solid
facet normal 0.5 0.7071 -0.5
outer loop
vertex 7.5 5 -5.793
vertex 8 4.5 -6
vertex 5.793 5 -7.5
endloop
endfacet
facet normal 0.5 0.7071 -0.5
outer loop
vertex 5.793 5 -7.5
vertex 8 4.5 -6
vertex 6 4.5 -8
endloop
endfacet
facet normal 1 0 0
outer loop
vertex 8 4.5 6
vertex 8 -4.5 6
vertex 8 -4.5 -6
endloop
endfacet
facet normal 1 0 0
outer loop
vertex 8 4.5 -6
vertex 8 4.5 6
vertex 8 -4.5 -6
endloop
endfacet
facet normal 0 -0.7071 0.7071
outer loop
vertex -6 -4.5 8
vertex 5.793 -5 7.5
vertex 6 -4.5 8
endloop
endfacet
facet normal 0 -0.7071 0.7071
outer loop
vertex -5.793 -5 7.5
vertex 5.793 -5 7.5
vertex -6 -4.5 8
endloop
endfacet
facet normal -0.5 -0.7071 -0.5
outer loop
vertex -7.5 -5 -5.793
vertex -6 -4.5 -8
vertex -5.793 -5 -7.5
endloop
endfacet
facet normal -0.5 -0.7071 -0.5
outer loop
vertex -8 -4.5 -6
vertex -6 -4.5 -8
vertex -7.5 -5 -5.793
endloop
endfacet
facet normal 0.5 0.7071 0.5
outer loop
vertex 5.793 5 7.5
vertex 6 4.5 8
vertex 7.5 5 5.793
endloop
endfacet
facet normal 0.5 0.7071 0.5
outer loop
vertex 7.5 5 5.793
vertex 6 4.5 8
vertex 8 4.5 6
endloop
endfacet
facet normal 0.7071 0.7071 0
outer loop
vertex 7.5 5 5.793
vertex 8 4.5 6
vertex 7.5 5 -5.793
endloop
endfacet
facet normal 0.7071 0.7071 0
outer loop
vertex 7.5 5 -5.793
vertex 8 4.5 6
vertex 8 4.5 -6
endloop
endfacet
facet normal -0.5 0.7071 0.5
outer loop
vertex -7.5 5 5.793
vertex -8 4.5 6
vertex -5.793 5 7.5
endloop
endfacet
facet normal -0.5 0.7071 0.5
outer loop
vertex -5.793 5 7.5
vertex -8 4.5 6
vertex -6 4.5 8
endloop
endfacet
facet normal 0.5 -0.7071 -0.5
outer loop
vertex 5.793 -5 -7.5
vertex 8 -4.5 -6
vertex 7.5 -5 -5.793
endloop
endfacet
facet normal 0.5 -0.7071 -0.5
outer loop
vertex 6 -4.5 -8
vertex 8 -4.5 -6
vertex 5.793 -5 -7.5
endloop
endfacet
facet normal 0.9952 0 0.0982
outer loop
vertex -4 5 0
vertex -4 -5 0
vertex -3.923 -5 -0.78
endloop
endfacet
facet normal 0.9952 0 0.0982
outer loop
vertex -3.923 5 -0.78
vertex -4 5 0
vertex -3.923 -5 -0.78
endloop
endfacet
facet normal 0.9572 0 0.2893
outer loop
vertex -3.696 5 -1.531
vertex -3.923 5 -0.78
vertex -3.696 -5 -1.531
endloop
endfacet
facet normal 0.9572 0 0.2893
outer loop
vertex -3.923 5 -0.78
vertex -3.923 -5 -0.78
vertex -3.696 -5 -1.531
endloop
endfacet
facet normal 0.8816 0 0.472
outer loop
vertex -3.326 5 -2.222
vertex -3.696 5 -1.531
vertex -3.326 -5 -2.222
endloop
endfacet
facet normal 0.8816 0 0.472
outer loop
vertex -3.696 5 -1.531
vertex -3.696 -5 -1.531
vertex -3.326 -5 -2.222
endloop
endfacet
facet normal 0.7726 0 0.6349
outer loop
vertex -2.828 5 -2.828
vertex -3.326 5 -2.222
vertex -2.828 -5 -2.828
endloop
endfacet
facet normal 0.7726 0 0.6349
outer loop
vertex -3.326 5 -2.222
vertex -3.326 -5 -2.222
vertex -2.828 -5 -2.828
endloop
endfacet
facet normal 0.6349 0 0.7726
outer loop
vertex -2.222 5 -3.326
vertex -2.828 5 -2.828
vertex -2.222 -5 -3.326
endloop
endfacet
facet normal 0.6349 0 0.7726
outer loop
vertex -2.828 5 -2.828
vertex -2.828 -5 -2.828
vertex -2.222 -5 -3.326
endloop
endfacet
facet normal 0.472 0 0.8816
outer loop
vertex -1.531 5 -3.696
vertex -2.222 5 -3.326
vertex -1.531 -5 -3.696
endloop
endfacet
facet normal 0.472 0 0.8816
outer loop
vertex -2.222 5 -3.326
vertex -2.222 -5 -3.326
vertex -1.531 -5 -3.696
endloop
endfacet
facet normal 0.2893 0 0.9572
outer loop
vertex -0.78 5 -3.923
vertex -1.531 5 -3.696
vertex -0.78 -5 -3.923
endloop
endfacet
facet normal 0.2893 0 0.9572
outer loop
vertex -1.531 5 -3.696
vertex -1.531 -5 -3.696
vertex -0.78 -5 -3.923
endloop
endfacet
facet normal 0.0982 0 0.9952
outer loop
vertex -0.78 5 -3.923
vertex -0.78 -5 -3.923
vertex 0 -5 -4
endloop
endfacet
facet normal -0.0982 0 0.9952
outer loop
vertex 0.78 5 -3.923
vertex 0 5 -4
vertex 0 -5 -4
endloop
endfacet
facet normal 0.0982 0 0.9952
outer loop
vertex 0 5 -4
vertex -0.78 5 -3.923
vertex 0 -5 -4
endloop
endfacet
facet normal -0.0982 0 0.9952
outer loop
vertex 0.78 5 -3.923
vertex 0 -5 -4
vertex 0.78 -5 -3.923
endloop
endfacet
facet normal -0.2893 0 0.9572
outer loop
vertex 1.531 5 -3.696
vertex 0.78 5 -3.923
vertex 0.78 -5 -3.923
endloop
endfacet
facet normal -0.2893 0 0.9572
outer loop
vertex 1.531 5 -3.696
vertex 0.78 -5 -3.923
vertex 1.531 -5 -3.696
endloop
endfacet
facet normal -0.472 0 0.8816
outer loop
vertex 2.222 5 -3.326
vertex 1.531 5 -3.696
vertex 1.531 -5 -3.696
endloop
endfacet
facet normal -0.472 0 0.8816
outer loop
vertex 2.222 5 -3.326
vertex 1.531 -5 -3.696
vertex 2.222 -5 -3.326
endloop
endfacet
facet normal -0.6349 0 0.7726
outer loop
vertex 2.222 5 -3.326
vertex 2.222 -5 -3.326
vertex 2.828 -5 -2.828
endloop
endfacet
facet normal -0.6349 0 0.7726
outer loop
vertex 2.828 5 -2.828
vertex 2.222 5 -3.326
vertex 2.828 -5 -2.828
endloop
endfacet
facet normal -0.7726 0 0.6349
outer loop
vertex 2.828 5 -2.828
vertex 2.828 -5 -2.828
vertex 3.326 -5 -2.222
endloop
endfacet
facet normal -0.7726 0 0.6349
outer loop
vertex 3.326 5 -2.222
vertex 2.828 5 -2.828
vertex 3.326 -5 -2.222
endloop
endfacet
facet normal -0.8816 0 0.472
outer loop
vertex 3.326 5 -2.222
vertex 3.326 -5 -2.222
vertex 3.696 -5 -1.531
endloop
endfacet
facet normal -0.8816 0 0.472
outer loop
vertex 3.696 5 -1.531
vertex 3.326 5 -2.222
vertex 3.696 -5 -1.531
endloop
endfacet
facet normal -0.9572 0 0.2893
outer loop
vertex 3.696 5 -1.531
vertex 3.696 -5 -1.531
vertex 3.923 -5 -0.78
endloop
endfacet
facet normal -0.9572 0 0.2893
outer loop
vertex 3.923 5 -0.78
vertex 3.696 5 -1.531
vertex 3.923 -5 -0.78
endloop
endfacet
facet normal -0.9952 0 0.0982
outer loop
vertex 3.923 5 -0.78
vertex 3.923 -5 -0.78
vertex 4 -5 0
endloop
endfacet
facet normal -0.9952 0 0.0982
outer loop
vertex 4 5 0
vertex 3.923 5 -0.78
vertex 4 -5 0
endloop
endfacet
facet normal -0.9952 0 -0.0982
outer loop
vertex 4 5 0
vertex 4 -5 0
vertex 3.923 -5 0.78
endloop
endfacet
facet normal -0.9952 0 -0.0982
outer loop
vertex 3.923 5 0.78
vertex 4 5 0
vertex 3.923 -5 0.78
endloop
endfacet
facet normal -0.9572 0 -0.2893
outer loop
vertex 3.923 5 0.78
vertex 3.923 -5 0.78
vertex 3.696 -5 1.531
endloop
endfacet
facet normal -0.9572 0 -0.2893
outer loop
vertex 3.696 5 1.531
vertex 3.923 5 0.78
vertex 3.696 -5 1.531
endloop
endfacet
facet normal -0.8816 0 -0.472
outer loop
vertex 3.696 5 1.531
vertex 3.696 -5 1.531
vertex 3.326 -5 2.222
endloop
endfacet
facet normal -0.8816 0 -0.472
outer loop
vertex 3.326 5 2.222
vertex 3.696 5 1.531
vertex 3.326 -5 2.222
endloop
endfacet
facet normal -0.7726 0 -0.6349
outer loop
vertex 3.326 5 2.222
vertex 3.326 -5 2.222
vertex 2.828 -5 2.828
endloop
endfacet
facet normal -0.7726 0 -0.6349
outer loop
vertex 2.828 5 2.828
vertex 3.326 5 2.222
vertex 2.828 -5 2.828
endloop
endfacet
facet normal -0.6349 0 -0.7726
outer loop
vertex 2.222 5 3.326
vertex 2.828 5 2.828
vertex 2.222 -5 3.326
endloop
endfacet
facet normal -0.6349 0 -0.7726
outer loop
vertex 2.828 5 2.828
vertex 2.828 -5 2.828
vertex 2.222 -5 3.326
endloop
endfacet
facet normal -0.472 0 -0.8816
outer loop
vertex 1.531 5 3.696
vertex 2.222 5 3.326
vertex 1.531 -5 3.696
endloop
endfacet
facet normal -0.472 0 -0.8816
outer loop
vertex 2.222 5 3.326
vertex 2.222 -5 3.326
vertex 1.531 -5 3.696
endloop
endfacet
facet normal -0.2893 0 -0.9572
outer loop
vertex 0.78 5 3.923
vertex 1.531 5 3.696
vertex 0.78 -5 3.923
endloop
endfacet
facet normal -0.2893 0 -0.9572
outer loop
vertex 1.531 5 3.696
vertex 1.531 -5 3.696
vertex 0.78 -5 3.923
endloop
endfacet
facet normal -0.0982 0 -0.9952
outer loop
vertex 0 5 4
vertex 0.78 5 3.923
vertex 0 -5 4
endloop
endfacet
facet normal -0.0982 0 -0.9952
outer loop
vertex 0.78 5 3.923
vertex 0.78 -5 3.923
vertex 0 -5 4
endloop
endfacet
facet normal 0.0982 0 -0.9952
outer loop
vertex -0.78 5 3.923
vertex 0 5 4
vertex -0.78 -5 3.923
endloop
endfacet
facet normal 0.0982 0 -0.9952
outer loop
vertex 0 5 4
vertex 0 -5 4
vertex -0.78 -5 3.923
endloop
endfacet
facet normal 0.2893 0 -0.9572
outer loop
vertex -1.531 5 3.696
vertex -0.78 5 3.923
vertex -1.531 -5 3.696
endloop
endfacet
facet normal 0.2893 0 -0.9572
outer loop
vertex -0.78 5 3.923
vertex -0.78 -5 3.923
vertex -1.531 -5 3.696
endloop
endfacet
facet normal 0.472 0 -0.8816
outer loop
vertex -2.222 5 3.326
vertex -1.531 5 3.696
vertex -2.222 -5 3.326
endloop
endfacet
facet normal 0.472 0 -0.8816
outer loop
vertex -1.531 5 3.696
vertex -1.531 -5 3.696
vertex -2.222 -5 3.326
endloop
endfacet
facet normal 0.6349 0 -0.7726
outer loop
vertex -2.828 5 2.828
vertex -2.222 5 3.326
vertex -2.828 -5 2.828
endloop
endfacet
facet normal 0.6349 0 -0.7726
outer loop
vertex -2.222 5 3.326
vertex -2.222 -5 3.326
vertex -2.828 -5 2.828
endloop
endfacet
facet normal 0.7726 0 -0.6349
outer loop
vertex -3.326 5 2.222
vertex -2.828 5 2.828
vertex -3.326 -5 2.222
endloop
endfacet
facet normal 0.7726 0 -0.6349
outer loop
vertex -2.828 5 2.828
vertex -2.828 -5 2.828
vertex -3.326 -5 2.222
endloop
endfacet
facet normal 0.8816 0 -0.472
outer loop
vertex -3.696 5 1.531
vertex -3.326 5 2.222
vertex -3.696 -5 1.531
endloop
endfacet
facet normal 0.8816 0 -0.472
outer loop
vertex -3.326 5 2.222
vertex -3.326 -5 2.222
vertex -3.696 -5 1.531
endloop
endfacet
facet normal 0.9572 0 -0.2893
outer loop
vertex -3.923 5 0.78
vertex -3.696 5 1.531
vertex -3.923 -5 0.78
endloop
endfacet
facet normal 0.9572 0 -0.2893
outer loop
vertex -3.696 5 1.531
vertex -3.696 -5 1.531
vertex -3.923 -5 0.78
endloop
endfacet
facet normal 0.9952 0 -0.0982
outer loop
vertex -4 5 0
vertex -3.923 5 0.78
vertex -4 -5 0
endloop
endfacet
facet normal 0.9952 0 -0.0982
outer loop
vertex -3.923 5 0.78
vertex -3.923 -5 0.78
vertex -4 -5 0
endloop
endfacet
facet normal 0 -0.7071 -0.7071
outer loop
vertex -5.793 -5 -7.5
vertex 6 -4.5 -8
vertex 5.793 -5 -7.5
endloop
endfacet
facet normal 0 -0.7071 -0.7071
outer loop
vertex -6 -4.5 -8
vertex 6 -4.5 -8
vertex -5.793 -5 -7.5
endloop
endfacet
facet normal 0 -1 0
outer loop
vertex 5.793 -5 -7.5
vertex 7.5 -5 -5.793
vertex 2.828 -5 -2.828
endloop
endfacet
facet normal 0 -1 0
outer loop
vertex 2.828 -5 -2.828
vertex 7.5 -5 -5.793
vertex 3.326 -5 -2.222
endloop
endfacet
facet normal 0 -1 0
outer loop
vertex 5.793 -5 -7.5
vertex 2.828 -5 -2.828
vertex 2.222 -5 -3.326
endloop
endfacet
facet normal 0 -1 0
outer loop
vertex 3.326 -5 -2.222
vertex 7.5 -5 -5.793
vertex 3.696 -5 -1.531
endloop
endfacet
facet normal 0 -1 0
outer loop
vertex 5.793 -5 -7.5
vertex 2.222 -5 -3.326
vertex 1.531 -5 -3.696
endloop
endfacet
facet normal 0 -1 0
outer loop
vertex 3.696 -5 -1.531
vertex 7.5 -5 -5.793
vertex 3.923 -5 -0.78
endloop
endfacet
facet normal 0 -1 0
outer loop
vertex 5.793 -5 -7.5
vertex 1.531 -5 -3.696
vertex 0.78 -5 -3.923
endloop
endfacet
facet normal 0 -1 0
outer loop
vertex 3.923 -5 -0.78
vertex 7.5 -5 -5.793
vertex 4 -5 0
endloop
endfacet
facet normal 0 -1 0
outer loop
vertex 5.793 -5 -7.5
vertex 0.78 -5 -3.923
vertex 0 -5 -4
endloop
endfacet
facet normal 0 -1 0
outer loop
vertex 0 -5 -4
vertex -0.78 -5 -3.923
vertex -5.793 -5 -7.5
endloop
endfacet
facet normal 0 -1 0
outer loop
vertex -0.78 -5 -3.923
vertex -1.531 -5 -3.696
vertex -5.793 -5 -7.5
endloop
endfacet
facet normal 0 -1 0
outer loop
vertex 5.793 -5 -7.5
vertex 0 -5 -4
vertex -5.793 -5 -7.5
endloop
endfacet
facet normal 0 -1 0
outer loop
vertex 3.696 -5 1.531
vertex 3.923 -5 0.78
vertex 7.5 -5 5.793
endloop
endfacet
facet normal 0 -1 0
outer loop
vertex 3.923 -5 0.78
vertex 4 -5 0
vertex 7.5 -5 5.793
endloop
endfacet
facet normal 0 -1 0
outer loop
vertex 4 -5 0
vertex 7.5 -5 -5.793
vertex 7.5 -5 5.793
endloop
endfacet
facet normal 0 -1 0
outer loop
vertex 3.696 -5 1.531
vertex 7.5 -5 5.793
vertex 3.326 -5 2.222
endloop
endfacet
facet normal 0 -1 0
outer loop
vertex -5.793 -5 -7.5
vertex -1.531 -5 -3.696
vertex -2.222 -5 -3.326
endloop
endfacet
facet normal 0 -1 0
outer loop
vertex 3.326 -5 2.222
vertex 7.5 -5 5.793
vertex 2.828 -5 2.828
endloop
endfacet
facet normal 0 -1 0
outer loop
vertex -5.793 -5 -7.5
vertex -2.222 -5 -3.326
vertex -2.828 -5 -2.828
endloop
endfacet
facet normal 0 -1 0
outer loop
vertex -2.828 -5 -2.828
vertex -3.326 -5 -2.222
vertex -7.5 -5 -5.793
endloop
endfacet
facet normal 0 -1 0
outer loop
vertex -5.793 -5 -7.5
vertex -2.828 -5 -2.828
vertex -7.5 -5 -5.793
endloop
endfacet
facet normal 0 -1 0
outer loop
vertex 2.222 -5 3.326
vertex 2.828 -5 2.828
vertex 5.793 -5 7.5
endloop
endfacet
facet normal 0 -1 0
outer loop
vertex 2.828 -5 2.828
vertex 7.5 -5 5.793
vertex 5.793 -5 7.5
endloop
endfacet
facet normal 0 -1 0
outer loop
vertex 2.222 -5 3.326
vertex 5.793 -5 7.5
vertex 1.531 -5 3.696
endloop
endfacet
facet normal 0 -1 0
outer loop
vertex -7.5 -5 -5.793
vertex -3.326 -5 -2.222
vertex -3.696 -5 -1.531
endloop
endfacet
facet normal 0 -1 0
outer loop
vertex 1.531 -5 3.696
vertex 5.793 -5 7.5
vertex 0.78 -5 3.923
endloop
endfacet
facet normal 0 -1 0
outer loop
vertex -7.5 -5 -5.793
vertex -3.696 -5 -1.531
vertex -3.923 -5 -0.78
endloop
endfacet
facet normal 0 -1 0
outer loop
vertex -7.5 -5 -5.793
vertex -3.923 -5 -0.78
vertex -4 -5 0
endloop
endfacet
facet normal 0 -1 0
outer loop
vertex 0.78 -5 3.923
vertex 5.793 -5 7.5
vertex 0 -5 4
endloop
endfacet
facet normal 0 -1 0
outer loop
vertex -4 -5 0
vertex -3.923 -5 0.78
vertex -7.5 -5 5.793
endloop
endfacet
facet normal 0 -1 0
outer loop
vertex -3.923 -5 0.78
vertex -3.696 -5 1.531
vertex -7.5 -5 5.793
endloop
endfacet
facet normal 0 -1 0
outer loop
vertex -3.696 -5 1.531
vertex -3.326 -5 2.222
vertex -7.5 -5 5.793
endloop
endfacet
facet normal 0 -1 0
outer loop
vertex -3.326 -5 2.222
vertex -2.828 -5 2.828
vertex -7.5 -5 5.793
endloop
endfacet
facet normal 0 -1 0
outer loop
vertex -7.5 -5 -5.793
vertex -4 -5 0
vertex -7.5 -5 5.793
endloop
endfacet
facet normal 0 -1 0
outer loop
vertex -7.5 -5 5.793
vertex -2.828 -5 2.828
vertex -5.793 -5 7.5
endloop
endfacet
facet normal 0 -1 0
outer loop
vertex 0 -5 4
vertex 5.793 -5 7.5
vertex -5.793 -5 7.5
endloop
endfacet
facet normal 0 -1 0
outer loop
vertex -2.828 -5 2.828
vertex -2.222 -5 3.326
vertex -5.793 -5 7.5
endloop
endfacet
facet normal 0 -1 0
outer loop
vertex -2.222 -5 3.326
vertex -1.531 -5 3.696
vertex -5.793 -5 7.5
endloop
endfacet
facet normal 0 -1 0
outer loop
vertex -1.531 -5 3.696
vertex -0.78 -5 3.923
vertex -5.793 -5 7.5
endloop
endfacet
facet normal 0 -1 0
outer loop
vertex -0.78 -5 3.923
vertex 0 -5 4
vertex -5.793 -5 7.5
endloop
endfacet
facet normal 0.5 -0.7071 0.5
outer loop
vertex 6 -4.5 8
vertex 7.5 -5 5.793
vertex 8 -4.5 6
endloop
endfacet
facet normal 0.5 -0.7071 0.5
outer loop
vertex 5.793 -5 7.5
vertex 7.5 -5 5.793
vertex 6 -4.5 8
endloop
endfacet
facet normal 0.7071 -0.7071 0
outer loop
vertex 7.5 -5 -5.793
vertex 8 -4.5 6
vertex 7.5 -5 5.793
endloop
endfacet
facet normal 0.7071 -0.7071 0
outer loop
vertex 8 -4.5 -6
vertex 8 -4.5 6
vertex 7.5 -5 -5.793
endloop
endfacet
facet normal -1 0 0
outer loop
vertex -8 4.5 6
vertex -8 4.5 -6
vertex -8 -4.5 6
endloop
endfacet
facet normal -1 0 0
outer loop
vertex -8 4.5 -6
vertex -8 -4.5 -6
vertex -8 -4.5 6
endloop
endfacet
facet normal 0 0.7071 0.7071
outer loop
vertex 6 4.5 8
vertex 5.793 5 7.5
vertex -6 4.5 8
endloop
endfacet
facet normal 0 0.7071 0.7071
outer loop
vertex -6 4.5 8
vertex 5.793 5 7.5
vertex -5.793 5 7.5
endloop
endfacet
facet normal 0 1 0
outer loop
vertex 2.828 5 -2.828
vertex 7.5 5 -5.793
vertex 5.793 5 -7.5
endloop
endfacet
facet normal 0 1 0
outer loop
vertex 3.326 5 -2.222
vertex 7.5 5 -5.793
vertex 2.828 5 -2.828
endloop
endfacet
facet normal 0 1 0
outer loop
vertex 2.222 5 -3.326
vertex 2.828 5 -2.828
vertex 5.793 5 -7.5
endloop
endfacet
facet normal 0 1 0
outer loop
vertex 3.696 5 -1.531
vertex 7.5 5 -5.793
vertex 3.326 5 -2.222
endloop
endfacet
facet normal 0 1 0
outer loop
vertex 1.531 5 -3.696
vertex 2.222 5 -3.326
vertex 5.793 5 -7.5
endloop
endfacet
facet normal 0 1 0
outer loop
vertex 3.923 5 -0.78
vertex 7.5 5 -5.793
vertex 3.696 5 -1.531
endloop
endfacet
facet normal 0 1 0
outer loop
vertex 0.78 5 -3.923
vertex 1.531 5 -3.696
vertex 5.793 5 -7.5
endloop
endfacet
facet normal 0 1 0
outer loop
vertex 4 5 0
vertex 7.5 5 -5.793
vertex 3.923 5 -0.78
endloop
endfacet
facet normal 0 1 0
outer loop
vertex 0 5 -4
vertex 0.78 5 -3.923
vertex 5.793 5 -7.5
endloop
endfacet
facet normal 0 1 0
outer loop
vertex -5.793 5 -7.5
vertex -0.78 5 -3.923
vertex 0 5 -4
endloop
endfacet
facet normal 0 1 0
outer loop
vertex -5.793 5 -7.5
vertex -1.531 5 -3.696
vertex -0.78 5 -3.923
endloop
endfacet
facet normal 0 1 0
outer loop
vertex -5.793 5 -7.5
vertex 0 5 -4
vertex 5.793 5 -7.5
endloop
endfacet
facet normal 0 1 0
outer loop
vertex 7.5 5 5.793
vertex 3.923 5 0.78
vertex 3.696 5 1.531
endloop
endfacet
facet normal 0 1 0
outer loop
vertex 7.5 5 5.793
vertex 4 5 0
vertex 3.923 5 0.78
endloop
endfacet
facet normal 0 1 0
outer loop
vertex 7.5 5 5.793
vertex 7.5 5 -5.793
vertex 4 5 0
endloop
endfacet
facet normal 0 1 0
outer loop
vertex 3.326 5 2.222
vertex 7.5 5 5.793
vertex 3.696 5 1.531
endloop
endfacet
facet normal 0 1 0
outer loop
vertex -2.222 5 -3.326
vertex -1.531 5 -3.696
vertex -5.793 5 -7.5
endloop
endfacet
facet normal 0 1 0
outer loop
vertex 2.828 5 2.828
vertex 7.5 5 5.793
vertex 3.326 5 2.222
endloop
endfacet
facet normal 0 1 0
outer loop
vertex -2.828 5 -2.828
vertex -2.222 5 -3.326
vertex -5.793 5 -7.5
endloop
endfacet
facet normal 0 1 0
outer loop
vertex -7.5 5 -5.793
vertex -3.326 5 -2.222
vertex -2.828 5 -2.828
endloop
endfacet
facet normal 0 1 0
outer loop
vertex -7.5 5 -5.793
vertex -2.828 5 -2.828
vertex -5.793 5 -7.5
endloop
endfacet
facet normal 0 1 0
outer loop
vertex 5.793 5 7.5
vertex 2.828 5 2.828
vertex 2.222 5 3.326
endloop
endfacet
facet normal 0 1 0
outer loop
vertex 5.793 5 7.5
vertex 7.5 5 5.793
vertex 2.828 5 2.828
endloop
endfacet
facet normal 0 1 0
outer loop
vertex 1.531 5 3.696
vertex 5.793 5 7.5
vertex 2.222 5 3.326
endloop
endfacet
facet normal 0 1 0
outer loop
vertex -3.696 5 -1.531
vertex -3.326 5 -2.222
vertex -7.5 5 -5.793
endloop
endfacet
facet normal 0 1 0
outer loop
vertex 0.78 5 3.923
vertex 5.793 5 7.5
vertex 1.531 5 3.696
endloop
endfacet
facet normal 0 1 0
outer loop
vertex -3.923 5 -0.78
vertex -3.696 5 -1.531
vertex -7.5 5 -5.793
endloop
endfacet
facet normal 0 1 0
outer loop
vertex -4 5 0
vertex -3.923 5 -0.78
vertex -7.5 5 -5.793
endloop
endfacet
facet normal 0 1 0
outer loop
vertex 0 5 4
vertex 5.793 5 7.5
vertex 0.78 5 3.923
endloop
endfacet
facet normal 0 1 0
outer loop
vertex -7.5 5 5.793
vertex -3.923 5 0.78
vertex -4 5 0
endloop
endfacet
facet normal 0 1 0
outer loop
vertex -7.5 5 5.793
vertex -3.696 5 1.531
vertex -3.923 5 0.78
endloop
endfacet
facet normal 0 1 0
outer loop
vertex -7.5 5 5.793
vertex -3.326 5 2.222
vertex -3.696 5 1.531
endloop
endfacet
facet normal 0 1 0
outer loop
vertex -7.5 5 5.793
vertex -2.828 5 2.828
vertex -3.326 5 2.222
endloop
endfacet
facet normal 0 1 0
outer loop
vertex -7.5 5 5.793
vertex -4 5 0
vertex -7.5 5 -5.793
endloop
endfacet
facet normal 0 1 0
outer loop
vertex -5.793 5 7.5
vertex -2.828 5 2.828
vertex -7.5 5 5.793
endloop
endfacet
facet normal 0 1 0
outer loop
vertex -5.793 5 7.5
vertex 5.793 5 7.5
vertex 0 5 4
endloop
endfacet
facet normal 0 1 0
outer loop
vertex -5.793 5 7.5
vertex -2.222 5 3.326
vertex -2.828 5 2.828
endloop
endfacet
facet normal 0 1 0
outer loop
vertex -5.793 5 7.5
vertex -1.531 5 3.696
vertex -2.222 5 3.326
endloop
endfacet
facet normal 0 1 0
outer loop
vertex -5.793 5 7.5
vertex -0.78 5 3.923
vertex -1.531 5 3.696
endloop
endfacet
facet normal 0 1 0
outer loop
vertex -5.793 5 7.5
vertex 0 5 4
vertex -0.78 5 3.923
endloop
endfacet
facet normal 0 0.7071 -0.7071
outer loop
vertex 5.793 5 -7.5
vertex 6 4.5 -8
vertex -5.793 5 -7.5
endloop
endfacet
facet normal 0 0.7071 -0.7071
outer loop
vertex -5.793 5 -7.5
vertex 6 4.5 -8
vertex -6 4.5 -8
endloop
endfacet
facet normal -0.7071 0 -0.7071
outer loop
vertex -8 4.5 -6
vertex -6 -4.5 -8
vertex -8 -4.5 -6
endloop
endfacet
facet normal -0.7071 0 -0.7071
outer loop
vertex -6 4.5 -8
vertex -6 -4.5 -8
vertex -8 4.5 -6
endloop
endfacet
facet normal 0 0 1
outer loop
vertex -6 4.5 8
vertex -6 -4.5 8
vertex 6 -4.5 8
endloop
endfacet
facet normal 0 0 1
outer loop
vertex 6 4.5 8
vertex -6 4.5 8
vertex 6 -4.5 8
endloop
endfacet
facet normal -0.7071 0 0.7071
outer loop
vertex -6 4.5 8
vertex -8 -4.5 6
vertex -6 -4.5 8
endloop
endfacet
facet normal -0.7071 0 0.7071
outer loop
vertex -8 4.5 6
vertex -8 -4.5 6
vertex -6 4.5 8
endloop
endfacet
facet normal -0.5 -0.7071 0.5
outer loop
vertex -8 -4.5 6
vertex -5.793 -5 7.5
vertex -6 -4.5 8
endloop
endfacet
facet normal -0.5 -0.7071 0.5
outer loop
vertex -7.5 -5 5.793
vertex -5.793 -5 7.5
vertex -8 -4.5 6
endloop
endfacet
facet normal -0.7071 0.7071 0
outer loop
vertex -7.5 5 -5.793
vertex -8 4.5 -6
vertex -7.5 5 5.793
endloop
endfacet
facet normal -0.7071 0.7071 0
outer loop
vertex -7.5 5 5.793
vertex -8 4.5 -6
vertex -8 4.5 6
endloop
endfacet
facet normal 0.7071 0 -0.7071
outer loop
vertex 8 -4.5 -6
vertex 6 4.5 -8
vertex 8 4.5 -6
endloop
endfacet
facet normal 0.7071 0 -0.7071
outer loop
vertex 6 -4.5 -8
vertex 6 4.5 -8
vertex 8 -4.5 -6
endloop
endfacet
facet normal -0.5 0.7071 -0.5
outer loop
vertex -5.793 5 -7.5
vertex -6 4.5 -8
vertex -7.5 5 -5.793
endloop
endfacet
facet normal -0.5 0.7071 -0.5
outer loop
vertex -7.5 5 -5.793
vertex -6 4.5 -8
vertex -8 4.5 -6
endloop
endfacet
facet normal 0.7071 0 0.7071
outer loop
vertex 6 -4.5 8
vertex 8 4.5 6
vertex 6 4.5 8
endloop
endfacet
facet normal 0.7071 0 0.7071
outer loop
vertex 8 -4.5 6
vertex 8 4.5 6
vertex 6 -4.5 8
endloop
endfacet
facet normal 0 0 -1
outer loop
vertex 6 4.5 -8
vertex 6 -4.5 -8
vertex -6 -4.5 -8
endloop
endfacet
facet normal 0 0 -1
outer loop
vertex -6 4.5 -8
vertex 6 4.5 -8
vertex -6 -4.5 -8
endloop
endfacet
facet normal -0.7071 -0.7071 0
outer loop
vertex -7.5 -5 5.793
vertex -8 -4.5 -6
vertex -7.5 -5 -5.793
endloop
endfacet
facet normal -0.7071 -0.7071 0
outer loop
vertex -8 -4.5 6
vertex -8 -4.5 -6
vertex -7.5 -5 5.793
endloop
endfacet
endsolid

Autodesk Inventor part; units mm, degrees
ref_plane "YZ Plane" through (0, 0, 0) normal (1, 0, 0) x (0, 1, 0)
ref_plane "XZ Plane" through (0, 0, 0) normal (0, 1, 0) x (-1, 0, 0)
ref_plane "XY Plane" through (0, 0, 0) normal (0, 0, 1) x (1, 0, 0)
sketch "Sketch1" plane through (0, 0, 0) normal (0, 1, 0) x (-1, 0, 0)
  line L0 (-8, 8) -> (-8, -8)
  line L1 (-8, -8) -> (8, -8)
  line L2 (8, -8) -> (8, 8)
  line L3 (8, 8) -> (-8, 8)
  line L4 (-8, 8) -> (8, -8) construction
  line L5 (-8, -8) -> (8, 8) construction
  circle A0 centre (0, 0) radius 4
  dimension "d0" = 16
  dimension "d1" = 8
extrude "Extrusion1" add sketch "Sketch1" along normal mid plane 10
chamfer "Chamfer1" distance 2 angle 45 4 edges at (8, 0, 8) (8, 0, -8) (-8, 0, 8) (-8, 0, -8)
chamfer "Chamfer2" distance 0.5 angle 45 16 edges at (-8, -5, 0) (-7, -5, -7) (0, -5, -8) (8, -5, 0) (7, -5, 7) (0, -5, 8) (-7, -5, 7) (7, -5, -7) (-7, 5, 7) (0, 5, 8) (-8, 5, 0) (-7, 5, -7) (0, 5, -8) (7, 5, -7) (8, 5, 0) (7, 5, 7)
properties part number "Vong_chan" material "Iron, Gray"
